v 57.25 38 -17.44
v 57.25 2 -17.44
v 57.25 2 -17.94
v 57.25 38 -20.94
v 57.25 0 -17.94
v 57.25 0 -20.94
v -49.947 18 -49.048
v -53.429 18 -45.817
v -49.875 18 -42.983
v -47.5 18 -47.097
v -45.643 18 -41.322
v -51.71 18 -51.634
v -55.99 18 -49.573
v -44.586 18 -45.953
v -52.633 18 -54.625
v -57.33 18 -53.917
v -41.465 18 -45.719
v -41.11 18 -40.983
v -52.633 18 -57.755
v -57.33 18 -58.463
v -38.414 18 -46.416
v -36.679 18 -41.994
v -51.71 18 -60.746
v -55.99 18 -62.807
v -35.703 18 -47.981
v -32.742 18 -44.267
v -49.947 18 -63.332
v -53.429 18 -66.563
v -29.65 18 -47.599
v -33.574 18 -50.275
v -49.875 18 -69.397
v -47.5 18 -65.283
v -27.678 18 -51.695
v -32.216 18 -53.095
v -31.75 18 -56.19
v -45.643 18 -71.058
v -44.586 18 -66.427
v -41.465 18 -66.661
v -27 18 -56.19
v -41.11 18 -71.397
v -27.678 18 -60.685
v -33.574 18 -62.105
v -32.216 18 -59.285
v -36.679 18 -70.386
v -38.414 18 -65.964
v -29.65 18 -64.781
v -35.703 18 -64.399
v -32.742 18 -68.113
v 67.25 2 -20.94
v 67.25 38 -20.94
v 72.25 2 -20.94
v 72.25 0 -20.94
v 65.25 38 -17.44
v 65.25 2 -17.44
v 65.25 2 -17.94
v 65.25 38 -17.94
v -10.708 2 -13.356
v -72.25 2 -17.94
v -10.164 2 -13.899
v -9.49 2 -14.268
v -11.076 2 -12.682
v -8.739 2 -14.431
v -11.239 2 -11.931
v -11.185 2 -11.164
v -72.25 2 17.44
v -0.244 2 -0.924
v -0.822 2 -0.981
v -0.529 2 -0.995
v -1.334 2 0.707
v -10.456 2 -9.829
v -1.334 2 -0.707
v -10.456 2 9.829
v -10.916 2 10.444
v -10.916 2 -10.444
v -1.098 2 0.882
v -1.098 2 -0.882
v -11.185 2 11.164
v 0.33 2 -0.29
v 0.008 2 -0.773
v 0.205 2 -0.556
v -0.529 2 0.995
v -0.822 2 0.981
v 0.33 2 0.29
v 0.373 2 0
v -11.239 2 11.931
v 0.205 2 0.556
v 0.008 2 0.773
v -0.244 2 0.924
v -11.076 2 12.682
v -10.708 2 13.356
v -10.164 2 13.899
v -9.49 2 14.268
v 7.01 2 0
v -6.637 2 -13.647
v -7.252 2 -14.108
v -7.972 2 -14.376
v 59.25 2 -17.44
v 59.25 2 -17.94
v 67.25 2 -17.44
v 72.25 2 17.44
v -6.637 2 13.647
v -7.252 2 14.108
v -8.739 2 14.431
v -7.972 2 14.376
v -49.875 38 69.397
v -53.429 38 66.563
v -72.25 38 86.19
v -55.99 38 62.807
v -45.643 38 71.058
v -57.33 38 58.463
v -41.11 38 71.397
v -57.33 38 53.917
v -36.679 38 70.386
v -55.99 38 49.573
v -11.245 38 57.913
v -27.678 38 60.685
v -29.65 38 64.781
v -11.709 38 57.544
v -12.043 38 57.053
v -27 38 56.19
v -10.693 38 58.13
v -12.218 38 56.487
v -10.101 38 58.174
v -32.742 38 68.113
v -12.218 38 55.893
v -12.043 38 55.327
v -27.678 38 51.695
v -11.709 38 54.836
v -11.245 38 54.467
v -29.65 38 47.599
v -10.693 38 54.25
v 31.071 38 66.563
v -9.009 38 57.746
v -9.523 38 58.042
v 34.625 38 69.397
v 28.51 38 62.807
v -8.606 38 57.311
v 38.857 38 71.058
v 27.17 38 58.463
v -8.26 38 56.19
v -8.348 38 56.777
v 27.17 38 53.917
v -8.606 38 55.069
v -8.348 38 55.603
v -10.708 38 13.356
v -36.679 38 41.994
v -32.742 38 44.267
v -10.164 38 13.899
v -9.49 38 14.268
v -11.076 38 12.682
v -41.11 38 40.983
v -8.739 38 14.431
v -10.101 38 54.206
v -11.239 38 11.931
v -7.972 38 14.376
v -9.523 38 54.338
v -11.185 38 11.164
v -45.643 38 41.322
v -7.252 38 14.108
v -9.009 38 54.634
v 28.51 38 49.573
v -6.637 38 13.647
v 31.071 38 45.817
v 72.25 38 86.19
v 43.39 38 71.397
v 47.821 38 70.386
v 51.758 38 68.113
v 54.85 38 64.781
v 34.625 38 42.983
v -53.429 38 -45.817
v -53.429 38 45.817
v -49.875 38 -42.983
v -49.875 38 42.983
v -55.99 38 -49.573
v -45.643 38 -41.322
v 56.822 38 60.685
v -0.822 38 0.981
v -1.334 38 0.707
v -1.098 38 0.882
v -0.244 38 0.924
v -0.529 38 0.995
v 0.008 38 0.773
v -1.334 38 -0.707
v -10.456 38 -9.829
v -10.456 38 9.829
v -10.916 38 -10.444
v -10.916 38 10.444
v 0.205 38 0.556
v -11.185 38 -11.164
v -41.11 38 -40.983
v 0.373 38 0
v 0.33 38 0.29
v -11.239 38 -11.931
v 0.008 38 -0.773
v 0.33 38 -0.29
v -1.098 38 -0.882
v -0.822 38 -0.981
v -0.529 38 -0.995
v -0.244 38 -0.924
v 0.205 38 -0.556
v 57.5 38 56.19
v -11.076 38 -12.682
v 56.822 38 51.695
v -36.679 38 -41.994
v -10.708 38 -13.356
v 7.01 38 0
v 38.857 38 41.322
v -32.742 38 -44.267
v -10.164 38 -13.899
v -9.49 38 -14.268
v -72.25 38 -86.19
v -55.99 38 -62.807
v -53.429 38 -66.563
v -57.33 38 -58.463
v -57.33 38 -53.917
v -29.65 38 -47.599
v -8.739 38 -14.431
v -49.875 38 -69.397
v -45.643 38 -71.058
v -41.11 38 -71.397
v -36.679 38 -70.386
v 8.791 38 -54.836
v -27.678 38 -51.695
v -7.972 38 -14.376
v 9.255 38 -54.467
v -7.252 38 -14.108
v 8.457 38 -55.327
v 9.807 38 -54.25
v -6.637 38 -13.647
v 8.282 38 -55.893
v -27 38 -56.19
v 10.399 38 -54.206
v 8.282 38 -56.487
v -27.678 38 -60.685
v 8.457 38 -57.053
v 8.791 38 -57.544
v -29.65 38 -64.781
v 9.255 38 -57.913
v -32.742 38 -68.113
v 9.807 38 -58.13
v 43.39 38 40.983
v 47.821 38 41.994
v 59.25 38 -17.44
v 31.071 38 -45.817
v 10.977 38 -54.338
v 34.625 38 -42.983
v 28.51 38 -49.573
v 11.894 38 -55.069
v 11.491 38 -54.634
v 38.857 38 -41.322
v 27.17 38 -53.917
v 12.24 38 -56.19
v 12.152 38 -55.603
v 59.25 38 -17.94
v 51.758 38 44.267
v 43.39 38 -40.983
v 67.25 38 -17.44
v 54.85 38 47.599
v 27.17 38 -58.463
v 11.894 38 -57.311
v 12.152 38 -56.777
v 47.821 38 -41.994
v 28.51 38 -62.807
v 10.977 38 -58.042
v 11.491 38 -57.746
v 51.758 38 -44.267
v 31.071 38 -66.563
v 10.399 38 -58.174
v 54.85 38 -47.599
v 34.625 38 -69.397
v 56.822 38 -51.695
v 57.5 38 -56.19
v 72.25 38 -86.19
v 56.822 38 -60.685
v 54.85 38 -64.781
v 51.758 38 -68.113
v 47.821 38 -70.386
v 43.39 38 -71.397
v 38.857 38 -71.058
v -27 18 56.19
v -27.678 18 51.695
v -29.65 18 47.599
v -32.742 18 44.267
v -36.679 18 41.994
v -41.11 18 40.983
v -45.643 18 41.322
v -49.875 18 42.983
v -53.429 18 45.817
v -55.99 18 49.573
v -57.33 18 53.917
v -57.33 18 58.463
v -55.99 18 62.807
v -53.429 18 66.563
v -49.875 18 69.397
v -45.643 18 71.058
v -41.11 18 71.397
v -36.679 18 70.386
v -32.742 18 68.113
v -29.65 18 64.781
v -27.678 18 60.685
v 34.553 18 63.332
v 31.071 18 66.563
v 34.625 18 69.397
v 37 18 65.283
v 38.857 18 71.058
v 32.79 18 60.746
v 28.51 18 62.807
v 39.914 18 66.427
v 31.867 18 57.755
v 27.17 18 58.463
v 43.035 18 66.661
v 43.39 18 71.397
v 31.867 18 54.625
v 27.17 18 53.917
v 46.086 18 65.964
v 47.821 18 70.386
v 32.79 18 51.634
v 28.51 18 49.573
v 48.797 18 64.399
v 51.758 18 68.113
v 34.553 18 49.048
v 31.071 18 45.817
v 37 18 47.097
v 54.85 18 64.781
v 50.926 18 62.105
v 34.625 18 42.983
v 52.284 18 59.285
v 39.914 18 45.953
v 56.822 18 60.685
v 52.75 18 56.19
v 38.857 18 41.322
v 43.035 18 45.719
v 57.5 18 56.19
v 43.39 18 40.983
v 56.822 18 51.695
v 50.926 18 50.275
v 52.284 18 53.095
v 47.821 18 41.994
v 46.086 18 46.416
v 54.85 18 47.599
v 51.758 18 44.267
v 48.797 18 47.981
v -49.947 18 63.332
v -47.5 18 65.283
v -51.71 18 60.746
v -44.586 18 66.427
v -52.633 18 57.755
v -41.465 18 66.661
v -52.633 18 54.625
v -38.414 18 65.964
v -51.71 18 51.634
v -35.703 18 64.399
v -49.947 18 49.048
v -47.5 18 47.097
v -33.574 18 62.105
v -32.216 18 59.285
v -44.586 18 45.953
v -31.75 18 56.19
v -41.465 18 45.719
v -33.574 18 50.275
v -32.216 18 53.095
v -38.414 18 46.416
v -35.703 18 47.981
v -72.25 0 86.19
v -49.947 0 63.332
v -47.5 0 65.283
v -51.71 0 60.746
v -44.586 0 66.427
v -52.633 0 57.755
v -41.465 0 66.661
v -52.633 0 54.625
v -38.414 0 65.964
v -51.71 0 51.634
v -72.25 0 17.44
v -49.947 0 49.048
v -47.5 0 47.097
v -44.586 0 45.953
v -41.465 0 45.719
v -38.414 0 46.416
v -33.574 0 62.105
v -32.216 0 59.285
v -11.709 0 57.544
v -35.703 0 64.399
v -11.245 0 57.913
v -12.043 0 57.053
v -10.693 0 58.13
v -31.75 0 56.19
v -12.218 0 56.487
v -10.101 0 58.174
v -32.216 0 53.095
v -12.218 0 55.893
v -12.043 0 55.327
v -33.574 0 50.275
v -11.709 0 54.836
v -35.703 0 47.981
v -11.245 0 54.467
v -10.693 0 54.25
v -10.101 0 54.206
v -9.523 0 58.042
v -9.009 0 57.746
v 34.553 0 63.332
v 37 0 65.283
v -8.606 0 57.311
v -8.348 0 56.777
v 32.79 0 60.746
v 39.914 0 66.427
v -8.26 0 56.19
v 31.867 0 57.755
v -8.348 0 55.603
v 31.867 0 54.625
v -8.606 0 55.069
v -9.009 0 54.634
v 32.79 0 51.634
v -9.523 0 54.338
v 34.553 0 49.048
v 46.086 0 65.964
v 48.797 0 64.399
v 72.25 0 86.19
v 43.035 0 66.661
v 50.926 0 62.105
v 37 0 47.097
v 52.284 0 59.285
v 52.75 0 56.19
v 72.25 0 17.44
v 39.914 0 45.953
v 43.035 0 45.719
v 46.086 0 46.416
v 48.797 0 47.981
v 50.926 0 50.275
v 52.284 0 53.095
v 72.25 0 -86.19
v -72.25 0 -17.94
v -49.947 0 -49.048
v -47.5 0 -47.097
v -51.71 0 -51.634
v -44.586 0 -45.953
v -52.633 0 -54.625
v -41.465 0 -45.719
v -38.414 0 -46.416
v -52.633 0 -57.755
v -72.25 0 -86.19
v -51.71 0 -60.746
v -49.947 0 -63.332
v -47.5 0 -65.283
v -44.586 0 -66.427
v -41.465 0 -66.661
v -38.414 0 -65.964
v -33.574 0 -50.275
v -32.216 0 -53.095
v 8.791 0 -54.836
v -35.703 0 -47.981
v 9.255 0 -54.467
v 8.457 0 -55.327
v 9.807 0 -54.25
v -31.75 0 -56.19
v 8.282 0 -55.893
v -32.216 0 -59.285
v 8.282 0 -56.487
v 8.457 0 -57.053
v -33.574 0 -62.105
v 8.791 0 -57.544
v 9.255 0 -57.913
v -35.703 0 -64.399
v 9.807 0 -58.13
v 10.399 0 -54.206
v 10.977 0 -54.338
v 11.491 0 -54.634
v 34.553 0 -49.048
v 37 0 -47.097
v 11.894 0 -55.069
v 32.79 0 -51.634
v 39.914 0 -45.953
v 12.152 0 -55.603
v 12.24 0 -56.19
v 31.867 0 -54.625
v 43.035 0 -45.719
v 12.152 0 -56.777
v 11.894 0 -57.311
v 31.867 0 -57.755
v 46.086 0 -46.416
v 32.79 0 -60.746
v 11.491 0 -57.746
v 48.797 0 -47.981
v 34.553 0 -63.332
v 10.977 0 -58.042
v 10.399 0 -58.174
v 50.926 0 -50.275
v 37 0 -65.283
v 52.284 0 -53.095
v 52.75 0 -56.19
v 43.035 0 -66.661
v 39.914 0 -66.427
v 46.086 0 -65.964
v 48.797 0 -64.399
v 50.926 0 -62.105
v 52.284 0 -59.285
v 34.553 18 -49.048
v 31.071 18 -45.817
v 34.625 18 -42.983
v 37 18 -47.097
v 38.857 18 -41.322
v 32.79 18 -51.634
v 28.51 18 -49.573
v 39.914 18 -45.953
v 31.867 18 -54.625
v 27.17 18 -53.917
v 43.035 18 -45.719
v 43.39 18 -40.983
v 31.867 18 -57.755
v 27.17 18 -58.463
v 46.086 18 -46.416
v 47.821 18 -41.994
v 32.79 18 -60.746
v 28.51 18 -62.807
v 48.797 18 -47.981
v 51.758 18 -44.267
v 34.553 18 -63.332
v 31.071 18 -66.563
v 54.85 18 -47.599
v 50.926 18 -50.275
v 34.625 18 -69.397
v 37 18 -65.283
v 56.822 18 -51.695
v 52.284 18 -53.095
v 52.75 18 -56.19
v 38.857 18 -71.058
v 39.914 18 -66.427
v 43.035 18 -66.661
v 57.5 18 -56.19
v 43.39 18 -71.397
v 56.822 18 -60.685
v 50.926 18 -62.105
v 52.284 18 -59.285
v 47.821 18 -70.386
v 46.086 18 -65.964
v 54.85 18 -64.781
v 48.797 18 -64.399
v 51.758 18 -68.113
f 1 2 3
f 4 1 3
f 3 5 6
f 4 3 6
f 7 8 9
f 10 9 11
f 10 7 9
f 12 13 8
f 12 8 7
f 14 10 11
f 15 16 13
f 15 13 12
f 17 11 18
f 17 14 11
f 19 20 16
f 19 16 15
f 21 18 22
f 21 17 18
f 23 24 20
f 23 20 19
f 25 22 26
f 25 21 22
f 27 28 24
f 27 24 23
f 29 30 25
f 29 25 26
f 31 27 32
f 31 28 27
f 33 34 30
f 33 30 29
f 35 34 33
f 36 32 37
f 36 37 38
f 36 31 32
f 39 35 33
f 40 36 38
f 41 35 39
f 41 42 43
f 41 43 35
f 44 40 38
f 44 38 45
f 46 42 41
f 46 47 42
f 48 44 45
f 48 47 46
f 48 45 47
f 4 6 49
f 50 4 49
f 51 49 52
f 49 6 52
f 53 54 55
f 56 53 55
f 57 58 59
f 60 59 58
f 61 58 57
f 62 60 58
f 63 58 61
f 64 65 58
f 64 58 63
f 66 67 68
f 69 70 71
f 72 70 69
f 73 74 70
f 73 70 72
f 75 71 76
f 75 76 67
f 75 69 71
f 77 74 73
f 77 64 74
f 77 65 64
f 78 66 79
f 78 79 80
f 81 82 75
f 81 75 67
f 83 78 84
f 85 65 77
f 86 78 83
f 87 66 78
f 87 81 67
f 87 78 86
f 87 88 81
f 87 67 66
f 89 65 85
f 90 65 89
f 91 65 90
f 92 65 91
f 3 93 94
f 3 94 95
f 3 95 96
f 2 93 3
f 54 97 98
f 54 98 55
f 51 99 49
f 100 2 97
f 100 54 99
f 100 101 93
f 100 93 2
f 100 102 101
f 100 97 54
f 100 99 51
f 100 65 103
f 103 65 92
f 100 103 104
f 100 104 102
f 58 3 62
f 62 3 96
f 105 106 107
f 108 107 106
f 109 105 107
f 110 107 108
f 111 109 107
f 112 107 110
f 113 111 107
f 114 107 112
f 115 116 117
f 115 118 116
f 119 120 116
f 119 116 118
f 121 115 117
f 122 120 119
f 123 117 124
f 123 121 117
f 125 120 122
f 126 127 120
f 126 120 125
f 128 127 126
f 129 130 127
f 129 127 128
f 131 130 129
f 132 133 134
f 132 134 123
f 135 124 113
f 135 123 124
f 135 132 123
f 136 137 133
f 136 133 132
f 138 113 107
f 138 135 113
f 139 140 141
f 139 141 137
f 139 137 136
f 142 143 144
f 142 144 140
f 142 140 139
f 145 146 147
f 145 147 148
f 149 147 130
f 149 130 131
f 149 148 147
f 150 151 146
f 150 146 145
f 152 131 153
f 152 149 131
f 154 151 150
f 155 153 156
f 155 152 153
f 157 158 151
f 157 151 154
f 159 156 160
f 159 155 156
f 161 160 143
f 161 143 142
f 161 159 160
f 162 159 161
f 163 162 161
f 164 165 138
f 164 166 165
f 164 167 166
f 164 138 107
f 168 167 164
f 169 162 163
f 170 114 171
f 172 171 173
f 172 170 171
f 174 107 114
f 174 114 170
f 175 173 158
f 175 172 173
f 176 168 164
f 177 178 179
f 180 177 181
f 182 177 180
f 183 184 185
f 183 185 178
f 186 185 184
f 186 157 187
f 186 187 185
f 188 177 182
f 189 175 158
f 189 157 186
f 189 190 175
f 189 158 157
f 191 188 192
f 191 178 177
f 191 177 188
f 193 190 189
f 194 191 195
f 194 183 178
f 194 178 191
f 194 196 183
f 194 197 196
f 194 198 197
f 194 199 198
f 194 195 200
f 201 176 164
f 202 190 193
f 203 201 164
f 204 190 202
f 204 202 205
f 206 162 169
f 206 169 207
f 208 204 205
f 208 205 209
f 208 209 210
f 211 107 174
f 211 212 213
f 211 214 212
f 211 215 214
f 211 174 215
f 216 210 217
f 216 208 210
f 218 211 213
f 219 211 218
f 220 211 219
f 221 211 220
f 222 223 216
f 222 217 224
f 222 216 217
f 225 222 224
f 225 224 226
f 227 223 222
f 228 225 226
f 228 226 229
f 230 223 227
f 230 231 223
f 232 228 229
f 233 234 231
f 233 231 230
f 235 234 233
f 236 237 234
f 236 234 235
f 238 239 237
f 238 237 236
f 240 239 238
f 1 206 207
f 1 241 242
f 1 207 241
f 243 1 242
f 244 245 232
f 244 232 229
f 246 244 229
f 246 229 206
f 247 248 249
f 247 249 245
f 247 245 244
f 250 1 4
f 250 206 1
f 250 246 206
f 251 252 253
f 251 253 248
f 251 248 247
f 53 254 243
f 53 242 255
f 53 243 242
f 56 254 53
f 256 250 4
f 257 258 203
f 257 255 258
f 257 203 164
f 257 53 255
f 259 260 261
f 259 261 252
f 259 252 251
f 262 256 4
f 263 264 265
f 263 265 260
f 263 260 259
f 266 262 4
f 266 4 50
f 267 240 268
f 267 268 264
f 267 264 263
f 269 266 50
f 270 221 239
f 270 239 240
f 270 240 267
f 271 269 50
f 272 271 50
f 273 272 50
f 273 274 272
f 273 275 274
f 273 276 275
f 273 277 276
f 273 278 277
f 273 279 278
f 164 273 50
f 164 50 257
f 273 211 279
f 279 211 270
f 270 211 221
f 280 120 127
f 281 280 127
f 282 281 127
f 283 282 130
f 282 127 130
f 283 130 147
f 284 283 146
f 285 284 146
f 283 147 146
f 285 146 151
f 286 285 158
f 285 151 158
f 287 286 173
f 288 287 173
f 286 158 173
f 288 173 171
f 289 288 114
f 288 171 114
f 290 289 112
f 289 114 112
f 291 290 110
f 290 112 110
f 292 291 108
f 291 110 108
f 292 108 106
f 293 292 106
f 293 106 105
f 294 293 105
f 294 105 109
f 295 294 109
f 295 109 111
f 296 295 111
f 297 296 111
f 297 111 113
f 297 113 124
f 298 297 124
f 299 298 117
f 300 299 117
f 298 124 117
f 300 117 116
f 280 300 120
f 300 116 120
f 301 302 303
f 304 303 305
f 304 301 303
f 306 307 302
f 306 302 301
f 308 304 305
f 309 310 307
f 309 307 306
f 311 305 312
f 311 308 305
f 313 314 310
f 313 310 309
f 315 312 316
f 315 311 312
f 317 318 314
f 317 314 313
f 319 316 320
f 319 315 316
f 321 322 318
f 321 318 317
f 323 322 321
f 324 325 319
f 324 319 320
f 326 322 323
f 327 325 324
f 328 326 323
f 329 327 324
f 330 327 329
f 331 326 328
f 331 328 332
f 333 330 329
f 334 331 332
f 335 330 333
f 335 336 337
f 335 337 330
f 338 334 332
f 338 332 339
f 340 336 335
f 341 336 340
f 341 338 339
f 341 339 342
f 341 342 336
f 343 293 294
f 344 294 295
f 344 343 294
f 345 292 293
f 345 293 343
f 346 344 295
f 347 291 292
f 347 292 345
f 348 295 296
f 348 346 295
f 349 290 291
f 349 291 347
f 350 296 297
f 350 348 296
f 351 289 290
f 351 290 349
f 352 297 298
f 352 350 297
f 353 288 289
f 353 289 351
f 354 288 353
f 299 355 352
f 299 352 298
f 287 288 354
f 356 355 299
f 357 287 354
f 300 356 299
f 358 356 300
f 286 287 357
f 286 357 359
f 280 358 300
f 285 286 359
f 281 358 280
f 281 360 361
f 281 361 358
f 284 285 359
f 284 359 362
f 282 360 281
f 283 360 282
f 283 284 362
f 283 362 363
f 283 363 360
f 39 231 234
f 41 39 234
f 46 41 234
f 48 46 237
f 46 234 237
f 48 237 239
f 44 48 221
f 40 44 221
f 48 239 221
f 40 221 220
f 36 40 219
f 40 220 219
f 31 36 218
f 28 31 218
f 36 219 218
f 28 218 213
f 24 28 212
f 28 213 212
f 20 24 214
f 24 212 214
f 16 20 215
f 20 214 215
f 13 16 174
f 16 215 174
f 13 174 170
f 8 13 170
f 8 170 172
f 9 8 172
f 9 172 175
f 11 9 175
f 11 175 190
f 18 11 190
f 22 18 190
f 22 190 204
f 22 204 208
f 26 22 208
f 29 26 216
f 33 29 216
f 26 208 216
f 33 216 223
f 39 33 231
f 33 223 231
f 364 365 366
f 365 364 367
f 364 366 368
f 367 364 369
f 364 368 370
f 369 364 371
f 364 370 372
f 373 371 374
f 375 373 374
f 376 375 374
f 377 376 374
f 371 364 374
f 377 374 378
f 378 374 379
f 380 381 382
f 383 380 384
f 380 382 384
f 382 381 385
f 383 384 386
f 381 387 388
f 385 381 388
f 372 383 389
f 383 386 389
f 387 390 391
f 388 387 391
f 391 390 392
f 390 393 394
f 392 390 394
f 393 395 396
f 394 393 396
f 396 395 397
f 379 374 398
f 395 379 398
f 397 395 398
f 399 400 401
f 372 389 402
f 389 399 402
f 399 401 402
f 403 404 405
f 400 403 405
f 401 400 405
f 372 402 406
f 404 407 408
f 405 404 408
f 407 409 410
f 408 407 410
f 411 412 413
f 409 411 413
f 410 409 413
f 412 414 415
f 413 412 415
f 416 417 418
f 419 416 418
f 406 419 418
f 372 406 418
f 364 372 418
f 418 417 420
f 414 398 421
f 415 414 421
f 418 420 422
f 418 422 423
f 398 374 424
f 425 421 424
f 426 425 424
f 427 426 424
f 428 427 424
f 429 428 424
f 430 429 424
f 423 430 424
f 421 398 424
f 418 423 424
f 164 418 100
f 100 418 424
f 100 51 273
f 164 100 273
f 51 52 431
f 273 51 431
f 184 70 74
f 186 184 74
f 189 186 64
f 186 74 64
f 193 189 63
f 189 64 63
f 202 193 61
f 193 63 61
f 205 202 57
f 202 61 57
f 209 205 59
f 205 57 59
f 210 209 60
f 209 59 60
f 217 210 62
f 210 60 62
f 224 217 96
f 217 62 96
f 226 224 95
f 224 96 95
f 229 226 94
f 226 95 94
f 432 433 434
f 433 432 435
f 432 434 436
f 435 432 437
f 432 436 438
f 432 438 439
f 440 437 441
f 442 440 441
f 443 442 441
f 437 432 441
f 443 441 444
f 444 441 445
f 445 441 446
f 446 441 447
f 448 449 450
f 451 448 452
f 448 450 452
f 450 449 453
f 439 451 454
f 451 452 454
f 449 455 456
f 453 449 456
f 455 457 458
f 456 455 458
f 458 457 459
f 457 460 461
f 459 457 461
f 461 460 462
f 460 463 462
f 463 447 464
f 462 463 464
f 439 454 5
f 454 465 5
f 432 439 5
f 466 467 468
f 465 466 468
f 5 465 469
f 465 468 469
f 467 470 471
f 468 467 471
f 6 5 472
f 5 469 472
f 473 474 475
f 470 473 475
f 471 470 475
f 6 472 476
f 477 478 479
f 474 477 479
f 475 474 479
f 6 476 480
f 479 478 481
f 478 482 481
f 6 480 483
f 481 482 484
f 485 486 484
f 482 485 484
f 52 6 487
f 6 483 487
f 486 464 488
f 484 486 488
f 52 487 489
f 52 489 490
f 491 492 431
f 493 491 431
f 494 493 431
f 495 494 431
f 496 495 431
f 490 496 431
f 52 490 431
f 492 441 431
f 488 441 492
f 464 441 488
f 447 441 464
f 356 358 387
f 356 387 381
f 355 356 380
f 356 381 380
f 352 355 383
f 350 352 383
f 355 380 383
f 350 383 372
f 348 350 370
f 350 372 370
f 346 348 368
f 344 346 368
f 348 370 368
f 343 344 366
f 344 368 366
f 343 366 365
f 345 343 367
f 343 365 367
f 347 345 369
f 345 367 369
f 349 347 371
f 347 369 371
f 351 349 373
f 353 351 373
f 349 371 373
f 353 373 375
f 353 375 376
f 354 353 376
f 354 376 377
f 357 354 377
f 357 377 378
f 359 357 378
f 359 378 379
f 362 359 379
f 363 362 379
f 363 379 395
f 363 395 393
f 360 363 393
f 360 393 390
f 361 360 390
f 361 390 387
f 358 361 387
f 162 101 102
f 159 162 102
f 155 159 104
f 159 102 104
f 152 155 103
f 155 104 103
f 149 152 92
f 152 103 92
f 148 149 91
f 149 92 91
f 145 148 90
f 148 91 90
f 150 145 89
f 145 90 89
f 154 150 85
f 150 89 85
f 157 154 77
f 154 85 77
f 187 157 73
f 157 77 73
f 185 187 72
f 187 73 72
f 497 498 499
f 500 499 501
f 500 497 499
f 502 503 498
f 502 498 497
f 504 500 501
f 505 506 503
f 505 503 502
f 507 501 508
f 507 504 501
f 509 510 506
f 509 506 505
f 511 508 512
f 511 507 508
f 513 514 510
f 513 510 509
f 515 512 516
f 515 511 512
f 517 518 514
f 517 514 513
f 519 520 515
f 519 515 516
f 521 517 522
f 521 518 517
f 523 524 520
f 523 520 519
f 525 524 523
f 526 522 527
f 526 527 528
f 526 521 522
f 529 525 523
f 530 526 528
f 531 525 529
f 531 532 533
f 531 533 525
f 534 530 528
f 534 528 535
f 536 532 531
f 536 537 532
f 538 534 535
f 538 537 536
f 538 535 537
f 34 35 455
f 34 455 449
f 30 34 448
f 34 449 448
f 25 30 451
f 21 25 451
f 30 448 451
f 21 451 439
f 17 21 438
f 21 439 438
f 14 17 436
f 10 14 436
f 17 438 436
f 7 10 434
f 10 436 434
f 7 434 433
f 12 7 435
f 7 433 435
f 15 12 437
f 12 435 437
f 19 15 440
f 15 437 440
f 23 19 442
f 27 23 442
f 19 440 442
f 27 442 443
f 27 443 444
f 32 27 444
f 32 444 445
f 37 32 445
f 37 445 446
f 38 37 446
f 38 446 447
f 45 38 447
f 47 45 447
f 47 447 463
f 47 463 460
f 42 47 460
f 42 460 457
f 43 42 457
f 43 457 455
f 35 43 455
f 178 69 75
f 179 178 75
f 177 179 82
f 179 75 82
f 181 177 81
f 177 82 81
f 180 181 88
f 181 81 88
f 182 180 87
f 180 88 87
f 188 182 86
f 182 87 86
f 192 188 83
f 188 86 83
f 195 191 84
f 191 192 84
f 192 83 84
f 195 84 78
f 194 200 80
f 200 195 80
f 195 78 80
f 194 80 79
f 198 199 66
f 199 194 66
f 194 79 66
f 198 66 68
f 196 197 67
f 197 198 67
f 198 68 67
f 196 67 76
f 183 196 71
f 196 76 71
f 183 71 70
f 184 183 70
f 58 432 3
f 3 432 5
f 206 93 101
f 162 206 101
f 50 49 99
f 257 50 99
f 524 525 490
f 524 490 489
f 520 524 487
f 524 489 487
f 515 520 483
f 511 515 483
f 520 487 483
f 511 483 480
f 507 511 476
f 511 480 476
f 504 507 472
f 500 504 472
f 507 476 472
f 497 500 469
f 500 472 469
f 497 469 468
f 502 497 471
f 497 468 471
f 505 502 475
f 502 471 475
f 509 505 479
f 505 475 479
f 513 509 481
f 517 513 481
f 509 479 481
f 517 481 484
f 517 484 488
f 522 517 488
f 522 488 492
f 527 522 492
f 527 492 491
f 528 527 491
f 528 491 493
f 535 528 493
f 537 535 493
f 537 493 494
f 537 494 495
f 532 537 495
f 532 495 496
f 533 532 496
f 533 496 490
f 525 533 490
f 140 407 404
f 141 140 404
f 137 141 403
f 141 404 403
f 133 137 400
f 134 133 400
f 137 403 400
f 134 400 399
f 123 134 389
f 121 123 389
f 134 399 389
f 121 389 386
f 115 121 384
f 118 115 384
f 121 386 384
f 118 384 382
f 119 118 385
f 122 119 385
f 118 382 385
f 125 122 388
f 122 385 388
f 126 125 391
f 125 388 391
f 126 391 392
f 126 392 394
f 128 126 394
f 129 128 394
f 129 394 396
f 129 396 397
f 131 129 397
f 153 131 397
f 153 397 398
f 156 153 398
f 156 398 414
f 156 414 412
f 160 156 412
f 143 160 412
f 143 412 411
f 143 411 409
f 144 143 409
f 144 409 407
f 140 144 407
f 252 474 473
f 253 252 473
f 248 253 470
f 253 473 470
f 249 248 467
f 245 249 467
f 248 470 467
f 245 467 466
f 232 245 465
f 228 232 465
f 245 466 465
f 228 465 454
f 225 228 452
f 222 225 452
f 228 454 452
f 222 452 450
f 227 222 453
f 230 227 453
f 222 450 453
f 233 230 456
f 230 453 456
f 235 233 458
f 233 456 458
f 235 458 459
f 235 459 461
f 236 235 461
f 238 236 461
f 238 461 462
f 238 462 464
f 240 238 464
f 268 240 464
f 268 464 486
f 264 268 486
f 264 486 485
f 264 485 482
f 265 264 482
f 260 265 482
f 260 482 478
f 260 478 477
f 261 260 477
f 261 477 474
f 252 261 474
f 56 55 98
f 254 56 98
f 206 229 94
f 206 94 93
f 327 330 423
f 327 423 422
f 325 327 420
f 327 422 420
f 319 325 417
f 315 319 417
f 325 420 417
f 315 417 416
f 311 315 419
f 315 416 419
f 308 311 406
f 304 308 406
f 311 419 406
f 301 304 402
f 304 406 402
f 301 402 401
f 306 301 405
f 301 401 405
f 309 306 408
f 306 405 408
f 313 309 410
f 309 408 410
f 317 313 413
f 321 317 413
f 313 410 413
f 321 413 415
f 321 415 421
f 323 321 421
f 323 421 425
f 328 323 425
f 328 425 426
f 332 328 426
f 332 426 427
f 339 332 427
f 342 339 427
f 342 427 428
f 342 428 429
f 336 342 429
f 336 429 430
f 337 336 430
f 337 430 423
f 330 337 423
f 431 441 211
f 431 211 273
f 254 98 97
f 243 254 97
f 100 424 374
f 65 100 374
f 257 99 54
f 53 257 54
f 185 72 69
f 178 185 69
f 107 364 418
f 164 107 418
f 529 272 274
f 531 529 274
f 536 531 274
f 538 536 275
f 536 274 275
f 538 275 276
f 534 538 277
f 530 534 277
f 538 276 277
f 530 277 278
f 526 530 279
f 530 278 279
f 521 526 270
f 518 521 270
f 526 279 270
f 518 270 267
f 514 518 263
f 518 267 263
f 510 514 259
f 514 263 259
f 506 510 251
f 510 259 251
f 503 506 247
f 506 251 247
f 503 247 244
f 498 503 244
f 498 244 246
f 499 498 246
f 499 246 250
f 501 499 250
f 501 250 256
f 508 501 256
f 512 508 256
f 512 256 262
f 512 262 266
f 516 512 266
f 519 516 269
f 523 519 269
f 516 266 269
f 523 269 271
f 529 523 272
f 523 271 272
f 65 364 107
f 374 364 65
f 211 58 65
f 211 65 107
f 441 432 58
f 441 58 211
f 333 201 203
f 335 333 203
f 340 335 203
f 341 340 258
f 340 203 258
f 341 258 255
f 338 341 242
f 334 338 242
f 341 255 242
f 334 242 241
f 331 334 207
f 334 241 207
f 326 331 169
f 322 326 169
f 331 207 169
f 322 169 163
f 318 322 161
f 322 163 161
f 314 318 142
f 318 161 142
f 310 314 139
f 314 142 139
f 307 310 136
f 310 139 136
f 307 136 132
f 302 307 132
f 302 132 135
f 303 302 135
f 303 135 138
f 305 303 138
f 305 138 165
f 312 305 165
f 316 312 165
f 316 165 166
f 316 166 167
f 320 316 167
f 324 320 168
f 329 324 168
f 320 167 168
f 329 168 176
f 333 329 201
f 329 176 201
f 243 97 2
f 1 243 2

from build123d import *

# Parameters (mm, degrees)
SKETCH1_W           = 144.5
SKETCH1_H           = 172.38
BOSS_EXTRUDE1_DEPTH = 38
SKETCH2_R           = 10.5
SKETCH2_R_2         = 1.99
CUT_EXTRUDE1_DEPTH  = 39
CUT_EXTRUDE2_DEPTH  = 2
SKETCH4_R           = 15.25
CUT_EXTRUDE3_DEPTH  = 20


with BuildPart() as part:
    # Sketch1 → Boss-Extrude1 (new body)
    with BuildSketch(Plane(origin=(0, 0, 0), x_dir=(1, 0, 0), z_dir=(0, 1, 0))):
        Rectangle(SKETCH1_W, SKETCH1_H)
    extrude(amount=BOSS_EXTRUDE1_DEPTH)

    # Sketch2 → Cut-Extrude1 (cut, through all)
    with BuildSketch(Plane.XZ):
        with Locations((-42.25, -56.19)):
            Circle(SKETCH2_R)
        with Locations((10.25, -56.19)):
            Circle(SKETCH2_R_2)
        with Locations((42.25, -56.19)):
            Circle(SKETCH2_R)
        with Locations((-42.25, 56.19)):
            Circle(SKETCH2_R)
        with Locations((-10.25, 56.19)):
            Circle(SKETCH2_R_2)
        with Locations((42.25, 56.19)):
            Circle(SKETCH2_R)
        Polygon((57.25, -20.94), (67.25, -20.94), (67.25, -17.44), (65.25, -17.44), (65.25, -17.94), (59.25, -17.94), (59.25, -17.44), (57.25, -17.44), align=None)
        with BuildLine():
            Line((-1.333860018, -0.707106781), (-10.455537495, -9.828784258))
            ThreePointArc((-10.455537495, -9.828784258), (-10.455537495, -13.647160877), (-6.637160877, -13.647160877))
            Line((-6.637160877, -13.647160877), (7.01, 0))
            Line((7.01, 0), (-6.637160877, 13.647160877))
            ThreePointArc((-6.637160877, 13.647160877), (-10.455537495, 13.647160877), (-10.455537495, 9.828784258))
            Line((-10.455537495, 9.828784258), (-1.333860018, 0.707106781))
            ThreePointArc((-1.333860018, 0.707106781), (0.373246763, 0), (-1.333860018, -0.707106781))
        make_face()
    extrude(amount=-CUT_EXTRUDE1_DEPTH, mode=Mode.SUBTRACT)

    # Sketch3 → Cut-Extrude2 (cut)
    with BuildSketch(Plane.XZ):
        Polygon((72.25, 17.44), (-72.25, 17.44), (-72.25, -17.94), (57.25, -17.94), (57.25, -17.44), (59.25, -17.44), (59.25, -17.94), (65.25, -17.94), (65.25, -17.44), (67.25, -17.44), (67.25, -20.94), (72.25, -20.94), align=None)
        with BuildLine():
            Line((7.01, 0), (-6.637160877, -13.647160877))
            ThreePointArc((-6.637160877, -13.647160877), (-10.455537495, -13.647160877), (-10.455537495, -9.828784258))
            Line((-10.455537495, -9.828784258), (-1.333860018, -0.707106781))
            ThreePointArc((-1.333860018, -0.707106781), (0.373246763, 0), (-1.333860018, 0.707106781))
            Line((-1.333860018, 0.707106781), (-10.455537495, 9.828784258))
            ThreePointArc((-10.455537495, 9.828784258), (-10.455537495, 13.647160877), (-6.637160877, 13.647160877))
            Line((-6.637160877, 13.647160877), (7.01, 0))
        make_face(mode=Mode.SUBTRACT)
    extrude(amount=-CUT_EXTRUDE2_DEPTH, mode=Mode.SUBTRACT)

    # Sketch4 → Cut-Extrude3 (cut)
    with BuildSketch(Plane(origin=(0, 38, 0), x_dir=(1, 0, 0), z_dir=(0, 1, 0))):
        with Locations((-42.25, 56.19)):
            Circle(SKETCH4_R)
        with Locations((42.25, 56.19)):
            Circle(SKETCH4_R)
        with Locations((42.25, -56.19)):
            Circle(SKETCH4_R)
        with Locations((-42.25, -56.19)):
            Circle(SKETCH4_R)
    extrude(amount=-CUT_EXTRUDE3_DEPTH, mode=Mode.SUBTRACT)


solid = part.part
